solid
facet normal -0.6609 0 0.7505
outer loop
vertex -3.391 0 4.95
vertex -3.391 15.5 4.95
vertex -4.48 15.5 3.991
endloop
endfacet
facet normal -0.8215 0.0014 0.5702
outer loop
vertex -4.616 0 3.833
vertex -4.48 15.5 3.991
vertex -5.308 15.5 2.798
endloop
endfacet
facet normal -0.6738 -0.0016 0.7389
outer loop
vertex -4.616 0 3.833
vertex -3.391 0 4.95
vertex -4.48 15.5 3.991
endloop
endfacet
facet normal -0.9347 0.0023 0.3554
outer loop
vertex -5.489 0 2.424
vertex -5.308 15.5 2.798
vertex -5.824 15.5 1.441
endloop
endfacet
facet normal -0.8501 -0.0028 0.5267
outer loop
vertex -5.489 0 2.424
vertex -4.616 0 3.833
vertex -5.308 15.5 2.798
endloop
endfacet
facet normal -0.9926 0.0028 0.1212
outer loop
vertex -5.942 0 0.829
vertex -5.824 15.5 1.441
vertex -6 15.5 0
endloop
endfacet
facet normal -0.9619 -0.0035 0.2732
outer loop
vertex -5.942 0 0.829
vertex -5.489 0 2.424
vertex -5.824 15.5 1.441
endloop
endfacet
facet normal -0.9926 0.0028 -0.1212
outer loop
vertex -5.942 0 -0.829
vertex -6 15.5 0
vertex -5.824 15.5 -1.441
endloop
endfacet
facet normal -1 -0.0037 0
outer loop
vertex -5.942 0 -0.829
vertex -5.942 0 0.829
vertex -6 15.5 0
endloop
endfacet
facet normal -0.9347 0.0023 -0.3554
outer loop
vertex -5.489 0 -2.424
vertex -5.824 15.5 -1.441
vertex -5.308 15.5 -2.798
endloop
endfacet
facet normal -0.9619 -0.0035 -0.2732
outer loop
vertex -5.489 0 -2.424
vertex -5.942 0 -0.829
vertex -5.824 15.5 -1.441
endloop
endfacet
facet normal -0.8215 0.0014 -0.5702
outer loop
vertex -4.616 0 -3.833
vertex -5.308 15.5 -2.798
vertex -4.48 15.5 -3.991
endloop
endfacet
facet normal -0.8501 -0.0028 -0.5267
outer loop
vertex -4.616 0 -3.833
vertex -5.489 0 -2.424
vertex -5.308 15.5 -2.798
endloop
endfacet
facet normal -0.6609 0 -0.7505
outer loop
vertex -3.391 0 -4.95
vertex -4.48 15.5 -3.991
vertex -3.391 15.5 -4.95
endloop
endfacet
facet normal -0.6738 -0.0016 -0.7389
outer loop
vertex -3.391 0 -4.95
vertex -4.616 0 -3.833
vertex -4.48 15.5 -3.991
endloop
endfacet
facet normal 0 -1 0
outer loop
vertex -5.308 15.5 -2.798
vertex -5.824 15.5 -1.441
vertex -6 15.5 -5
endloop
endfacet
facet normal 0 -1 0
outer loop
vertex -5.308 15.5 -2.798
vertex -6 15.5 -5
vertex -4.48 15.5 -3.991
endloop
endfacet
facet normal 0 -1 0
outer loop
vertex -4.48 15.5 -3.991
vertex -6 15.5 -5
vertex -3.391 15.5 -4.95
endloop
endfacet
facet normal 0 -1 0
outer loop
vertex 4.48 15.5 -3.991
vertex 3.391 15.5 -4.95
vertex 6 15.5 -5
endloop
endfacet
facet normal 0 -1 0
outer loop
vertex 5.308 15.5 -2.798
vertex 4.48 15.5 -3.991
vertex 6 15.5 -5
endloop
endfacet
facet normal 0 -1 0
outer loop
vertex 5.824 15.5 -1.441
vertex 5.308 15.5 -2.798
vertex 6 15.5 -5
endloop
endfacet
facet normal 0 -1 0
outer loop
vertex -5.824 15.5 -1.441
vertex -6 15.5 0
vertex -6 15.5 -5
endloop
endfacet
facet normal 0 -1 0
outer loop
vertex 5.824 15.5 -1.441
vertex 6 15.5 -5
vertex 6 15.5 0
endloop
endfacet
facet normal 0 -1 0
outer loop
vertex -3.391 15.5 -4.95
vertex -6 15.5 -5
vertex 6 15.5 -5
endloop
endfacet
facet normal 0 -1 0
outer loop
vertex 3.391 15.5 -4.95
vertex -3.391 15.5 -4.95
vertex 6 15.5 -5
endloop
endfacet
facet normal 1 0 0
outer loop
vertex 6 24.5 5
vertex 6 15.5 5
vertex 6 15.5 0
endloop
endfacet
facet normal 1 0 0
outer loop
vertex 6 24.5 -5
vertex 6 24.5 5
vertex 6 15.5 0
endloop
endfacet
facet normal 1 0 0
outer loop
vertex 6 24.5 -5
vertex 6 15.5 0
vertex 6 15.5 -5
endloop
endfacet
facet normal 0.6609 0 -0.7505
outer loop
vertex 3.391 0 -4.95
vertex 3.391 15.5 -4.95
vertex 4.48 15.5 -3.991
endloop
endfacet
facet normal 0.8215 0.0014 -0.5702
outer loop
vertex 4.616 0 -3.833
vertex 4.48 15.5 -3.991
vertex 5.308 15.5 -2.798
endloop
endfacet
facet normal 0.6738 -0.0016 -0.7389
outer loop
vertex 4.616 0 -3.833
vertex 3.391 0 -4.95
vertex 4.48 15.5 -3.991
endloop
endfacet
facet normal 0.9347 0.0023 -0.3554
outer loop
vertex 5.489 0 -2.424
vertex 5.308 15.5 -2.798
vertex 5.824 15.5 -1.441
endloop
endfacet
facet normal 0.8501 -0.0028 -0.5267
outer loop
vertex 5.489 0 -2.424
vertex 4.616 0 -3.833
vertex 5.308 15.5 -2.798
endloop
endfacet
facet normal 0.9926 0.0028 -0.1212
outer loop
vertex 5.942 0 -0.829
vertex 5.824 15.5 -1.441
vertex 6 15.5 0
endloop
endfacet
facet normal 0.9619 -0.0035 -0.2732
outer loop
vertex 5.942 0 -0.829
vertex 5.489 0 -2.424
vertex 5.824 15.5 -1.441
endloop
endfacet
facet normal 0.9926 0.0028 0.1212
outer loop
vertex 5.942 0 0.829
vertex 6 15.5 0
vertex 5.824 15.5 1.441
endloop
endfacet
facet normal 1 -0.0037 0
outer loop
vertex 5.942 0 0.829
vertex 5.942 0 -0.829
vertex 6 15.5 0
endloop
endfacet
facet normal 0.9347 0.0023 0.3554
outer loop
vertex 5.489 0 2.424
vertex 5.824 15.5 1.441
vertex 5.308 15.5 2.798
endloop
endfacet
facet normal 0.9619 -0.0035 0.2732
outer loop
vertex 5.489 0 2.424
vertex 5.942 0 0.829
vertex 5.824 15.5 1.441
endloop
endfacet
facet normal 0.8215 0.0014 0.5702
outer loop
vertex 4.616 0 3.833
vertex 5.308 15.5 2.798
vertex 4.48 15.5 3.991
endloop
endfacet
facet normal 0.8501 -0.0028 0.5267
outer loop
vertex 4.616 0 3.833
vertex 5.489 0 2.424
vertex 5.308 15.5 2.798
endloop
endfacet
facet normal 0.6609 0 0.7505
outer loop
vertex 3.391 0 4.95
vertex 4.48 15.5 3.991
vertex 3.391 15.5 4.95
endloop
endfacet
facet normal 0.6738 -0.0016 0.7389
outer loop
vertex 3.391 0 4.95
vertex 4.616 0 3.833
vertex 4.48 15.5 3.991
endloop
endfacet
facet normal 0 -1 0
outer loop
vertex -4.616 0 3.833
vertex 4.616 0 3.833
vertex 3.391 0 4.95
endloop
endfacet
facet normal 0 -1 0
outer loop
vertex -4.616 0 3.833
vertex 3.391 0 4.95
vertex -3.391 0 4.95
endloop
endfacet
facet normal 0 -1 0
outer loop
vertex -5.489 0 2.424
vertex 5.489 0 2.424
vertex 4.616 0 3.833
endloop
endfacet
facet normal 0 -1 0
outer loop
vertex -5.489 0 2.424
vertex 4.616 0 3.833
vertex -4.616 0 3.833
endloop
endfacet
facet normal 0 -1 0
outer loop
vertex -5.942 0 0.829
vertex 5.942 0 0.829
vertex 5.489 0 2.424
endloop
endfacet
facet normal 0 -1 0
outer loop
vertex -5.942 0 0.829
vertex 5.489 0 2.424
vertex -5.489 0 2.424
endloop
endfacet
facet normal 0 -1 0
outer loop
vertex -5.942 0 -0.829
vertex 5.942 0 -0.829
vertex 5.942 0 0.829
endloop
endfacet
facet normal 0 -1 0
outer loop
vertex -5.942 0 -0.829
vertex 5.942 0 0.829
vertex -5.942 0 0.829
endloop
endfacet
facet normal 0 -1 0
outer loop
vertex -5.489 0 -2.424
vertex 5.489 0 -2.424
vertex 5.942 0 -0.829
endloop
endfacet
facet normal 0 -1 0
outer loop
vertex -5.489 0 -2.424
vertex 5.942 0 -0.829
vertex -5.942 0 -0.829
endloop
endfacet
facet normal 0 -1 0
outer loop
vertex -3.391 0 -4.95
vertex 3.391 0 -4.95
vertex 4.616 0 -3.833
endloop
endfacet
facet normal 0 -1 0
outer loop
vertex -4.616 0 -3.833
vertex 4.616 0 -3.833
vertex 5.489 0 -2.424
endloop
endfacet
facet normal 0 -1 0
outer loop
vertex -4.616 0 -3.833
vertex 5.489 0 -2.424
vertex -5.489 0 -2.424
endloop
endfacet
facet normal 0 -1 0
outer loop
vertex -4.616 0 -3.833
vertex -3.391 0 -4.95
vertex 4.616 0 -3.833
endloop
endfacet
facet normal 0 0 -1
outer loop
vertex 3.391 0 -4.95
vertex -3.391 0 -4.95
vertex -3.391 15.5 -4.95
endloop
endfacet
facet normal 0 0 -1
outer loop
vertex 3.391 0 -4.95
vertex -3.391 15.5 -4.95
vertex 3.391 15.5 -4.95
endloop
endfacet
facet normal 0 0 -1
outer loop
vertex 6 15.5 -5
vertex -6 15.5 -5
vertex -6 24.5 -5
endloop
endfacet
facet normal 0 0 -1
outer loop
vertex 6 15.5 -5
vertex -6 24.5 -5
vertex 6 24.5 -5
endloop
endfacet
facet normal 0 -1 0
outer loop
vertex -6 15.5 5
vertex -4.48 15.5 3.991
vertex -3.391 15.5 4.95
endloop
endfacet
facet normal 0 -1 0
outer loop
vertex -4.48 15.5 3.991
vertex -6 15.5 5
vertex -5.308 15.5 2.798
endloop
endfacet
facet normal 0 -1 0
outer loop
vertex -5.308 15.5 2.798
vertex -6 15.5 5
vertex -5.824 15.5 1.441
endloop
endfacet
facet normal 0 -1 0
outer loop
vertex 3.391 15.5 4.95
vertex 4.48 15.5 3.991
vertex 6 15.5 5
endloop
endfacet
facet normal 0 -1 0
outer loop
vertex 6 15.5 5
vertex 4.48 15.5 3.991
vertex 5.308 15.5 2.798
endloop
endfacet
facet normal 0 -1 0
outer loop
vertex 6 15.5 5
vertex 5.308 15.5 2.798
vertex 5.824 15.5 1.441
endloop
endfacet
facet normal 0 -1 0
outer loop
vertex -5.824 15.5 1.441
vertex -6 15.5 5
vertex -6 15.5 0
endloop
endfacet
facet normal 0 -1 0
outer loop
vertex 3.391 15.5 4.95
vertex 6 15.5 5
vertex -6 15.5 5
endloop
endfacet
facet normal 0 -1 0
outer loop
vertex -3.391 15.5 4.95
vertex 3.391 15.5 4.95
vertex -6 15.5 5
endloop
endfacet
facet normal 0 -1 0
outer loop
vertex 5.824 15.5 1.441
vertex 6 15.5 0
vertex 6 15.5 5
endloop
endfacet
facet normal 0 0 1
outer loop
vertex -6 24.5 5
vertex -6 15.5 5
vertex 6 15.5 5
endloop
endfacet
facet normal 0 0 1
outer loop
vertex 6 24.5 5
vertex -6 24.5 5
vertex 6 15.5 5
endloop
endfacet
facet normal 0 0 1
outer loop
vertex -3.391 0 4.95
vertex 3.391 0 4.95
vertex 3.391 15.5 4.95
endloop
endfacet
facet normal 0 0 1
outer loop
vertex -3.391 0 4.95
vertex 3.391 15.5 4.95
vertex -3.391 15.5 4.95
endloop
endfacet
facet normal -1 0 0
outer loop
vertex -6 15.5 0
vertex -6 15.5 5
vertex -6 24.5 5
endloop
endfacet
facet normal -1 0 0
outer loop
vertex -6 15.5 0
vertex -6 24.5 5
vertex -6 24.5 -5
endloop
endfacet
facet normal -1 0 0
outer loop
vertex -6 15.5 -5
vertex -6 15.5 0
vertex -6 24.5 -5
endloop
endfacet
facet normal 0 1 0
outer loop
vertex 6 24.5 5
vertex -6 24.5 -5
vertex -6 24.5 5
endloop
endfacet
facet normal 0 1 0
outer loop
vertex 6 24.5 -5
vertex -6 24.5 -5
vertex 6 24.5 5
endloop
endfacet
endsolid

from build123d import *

# Parameters (mm, degrees)
BOSS_EXTRUDE1_DEPTH = 15.5
SKETCH2_W           = 12
SKETCH2_H           = 10
BOSS_EXTRUDE2_DEPTH = 9


with BuildPart() as part:
    # Sketch1 → Boss-Extrude1 (new body)
    with BuildSketch(Plane(origin=(0, 0, 0), x_dir=(1, 0, 0), z_dir=(0, 1, 0))):
        with BuildLine():
            Line((-3.390796367, 4.95), (3.390796367, 4.95))
            ThreePointArc((3.390796367, 4.95), (6, 0), (3.390796367, -4.95))
            Line((3.390796367, -4.95), (-3.390796367, -4.95))
            ThreePointArc((-3.390796367, -4.95), (-6, 0), (-3.390796367, 4.95))
        make_face()
    extrude(amount=BOSS_EXTRUDE1_DEPTH)

    # Sketch2 → Boss-Extrude2 (add)
    with BuildSketch(Plane(origin=(0, 15.5, 0), x_dir=(1, 0, 0), z_dir=(0, 1, 0))):
        Rectangle(SKETCH2_W, SKETCH2_H)
    extrude(amount=BOSS_EXTRUDE2_DEPTH)


solid = part.part
